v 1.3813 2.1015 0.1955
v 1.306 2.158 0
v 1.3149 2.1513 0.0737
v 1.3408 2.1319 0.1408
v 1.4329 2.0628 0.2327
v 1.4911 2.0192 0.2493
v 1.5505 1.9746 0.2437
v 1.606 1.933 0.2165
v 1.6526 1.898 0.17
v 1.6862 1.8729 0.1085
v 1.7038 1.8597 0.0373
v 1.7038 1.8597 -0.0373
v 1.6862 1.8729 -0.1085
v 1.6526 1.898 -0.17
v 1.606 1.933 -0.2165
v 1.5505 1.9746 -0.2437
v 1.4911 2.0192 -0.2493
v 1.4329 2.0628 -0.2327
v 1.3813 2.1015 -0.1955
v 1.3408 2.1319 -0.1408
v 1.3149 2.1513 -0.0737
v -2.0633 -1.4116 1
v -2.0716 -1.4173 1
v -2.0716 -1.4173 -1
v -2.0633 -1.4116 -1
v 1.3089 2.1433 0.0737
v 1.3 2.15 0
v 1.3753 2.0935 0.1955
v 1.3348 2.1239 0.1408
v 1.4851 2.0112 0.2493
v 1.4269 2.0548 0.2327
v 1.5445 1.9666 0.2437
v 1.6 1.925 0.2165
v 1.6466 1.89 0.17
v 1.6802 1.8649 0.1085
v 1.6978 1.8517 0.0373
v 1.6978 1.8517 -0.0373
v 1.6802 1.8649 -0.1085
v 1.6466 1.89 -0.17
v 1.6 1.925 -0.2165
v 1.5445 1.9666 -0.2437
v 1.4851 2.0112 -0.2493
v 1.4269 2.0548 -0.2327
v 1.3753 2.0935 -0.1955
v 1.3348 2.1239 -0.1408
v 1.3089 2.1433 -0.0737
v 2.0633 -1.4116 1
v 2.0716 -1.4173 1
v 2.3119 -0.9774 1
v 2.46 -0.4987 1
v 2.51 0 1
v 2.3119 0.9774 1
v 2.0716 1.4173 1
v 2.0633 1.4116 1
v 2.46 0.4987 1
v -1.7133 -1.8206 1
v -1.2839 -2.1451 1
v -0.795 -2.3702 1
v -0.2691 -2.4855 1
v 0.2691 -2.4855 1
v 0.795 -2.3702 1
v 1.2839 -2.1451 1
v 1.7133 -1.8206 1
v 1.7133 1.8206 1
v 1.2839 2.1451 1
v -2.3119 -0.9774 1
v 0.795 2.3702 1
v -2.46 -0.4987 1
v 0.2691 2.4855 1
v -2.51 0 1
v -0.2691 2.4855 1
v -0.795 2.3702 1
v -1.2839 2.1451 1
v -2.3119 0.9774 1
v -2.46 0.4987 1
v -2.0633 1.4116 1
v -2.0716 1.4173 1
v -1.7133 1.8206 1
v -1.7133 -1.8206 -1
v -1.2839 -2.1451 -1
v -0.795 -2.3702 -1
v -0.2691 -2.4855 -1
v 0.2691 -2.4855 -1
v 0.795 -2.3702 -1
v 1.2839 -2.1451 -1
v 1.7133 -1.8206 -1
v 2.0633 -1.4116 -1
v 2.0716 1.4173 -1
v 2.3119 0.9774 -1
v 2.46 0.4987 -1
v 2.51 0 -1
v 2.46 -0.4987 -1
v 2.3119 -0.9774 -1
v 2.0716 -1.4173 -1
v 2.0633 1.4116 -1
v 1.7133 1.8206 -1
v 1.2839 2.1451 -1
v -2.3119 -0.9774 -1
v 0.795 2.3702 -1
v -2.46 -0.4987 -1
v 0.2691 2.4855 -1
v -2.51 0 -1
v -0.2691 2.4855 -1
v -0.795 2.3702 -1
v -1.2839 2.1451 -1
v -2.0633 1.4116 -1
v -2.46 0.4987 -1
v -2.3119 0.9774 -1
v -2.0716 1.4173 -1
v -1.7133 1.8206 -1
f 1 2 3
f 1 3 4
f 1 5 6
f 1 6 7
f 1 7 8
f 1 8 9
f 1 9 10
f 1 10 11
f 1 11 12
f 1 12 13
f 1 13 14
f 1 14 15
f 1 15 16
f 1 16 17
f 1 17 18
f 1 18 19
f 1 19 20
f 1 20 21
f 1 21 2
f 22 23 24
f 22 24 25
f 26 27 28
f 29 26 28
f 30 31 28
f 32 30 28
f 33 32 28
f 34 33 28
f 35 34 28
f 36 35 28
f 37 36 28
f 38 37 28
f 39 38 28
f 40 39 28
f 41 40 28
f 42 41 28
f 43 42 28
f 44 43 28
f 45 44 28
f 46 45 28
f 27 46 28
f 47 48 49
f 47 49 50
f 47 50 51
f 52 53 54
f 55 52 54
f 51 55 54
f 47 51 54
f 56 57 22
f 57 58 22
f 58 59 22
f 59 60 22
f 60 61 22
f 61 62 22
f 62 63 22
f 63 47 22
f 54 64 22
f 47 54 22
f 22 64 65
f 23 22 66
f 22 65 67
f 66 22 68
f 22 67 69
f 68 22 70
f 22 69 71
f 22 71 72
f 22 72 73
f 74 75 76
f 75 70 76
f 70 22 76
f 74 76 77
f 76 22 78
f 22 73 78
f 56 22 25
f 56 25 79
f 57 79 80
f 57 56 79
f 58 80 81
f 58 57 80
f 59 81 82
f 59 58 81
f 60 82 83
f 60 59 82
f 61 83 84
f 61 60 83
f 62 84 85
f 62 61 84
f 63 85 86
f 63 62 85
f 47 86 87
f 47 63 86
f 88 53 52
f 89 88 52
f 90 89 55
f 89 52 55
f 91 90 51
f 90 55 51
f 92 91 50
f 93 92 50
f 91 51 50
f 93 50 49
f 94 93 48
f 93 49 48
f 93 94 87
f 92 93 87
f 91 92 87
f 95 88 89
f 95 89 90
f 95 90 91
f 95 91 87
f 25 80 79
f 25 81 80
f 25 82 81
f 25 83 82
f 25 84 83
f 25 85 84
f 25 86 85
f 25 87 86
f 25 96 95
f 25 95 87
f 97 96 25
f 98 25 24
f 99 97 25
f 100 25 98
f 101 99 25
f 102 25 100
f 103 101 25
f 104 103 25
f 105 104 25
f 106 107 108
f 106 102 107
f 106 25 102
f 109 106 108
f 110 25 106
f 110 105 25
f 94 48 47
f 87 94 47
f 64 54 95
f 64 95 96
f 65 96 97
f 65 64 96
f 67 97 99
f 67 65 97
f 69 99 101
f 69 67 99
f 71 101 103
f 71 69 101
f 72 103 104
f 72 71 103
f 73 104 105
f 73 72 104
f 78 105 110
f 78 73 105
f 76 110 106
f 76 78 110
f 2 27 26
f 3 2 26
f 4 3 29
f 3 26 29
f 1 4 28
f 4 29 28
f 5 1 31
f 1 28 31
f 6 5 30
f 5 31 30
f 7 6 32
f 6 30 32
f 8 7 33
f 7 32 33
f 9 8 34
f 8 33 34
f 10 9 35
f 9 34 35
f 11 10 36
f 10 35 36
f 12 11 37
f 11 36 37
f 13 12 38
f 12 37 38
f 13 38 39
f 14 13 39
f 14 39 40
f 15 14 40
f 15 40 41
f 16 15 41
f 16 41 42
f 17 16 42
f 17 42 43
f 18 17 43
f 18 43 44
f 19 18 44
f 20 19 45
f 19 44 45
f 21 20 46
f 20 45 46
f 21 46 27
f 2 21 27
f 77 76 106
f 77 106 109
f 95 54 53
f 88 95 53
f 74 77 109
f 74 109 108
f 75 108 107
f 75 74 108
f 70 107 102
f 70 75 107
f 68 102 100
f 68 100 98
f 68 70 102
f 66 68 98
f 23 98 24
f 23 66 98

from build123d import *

# Parameters (mm, degrees)
SKETCH1_R           = 2.5
BOSS_EXTRUDE3_DEPTH = 1
BOSS_EXTRUDE4_DEPTH = 2
SKETCH12_4_R        = 0.25
BOSS_EXTRUDE5_DEPTH = 0.01


with BuildPart() as part:
    # Sketch1 → Boss-Extrude3 (new body, symmetric)
    with BuildSketch(Plane.XY):
        Circle(SKETCH1_R)
    extrude(amount=BOSS_EXTRUDE3_DEPTH, both=True)

    # Sketch2 → Boss-Extrude4 (add)
    with BuildSketch(Plane.XY.offset(1)):
        with BuildLine():
            Line((2.063339037, 1.411606183), (2.071592393, 1.417252608))
            ThreePointArc((2.071592393, 1.417252608), (2.51, 0), (2.071592393, -1.417252608))
            Line((2.071592393, -1.417252608), (2.063339037, -1.411606183))
            ThreePointArc((2.063339037, -1.411606183), (2.5, 0), (2.063339037, 1.411606183))
        make_face()
    boss_extrude4 = extrude(amount=-BOSS_EXTRUDE4_DEPTH)

    # Mirror1: Boss-Extrude4 across plane
    add(boss_extrude4.mirror(Plane(origin=(0, 0, 0), x_dir=(0, 0, 1), z_dir=(1, 0, 0))))


with BuildPart() as body_2:
    # Sketch12_4 → Boss-Extrude5 (new body)
    with BuildSketch(Plane(origin=(1.5, 2, 0), x_dir=(0.8, -0.6, 0), z_dir=(0.6, 0.8, 0))):
        with Locations(Location((0, 0, 0), (0, 0, 180))):  # turned: the seam where the file's is
            Circle(SKETCH12_4_R)
    extrude(amount=BOSS_EXTRUDE5_DEPTH)


solid = Compound([part.part, body_2.part])
